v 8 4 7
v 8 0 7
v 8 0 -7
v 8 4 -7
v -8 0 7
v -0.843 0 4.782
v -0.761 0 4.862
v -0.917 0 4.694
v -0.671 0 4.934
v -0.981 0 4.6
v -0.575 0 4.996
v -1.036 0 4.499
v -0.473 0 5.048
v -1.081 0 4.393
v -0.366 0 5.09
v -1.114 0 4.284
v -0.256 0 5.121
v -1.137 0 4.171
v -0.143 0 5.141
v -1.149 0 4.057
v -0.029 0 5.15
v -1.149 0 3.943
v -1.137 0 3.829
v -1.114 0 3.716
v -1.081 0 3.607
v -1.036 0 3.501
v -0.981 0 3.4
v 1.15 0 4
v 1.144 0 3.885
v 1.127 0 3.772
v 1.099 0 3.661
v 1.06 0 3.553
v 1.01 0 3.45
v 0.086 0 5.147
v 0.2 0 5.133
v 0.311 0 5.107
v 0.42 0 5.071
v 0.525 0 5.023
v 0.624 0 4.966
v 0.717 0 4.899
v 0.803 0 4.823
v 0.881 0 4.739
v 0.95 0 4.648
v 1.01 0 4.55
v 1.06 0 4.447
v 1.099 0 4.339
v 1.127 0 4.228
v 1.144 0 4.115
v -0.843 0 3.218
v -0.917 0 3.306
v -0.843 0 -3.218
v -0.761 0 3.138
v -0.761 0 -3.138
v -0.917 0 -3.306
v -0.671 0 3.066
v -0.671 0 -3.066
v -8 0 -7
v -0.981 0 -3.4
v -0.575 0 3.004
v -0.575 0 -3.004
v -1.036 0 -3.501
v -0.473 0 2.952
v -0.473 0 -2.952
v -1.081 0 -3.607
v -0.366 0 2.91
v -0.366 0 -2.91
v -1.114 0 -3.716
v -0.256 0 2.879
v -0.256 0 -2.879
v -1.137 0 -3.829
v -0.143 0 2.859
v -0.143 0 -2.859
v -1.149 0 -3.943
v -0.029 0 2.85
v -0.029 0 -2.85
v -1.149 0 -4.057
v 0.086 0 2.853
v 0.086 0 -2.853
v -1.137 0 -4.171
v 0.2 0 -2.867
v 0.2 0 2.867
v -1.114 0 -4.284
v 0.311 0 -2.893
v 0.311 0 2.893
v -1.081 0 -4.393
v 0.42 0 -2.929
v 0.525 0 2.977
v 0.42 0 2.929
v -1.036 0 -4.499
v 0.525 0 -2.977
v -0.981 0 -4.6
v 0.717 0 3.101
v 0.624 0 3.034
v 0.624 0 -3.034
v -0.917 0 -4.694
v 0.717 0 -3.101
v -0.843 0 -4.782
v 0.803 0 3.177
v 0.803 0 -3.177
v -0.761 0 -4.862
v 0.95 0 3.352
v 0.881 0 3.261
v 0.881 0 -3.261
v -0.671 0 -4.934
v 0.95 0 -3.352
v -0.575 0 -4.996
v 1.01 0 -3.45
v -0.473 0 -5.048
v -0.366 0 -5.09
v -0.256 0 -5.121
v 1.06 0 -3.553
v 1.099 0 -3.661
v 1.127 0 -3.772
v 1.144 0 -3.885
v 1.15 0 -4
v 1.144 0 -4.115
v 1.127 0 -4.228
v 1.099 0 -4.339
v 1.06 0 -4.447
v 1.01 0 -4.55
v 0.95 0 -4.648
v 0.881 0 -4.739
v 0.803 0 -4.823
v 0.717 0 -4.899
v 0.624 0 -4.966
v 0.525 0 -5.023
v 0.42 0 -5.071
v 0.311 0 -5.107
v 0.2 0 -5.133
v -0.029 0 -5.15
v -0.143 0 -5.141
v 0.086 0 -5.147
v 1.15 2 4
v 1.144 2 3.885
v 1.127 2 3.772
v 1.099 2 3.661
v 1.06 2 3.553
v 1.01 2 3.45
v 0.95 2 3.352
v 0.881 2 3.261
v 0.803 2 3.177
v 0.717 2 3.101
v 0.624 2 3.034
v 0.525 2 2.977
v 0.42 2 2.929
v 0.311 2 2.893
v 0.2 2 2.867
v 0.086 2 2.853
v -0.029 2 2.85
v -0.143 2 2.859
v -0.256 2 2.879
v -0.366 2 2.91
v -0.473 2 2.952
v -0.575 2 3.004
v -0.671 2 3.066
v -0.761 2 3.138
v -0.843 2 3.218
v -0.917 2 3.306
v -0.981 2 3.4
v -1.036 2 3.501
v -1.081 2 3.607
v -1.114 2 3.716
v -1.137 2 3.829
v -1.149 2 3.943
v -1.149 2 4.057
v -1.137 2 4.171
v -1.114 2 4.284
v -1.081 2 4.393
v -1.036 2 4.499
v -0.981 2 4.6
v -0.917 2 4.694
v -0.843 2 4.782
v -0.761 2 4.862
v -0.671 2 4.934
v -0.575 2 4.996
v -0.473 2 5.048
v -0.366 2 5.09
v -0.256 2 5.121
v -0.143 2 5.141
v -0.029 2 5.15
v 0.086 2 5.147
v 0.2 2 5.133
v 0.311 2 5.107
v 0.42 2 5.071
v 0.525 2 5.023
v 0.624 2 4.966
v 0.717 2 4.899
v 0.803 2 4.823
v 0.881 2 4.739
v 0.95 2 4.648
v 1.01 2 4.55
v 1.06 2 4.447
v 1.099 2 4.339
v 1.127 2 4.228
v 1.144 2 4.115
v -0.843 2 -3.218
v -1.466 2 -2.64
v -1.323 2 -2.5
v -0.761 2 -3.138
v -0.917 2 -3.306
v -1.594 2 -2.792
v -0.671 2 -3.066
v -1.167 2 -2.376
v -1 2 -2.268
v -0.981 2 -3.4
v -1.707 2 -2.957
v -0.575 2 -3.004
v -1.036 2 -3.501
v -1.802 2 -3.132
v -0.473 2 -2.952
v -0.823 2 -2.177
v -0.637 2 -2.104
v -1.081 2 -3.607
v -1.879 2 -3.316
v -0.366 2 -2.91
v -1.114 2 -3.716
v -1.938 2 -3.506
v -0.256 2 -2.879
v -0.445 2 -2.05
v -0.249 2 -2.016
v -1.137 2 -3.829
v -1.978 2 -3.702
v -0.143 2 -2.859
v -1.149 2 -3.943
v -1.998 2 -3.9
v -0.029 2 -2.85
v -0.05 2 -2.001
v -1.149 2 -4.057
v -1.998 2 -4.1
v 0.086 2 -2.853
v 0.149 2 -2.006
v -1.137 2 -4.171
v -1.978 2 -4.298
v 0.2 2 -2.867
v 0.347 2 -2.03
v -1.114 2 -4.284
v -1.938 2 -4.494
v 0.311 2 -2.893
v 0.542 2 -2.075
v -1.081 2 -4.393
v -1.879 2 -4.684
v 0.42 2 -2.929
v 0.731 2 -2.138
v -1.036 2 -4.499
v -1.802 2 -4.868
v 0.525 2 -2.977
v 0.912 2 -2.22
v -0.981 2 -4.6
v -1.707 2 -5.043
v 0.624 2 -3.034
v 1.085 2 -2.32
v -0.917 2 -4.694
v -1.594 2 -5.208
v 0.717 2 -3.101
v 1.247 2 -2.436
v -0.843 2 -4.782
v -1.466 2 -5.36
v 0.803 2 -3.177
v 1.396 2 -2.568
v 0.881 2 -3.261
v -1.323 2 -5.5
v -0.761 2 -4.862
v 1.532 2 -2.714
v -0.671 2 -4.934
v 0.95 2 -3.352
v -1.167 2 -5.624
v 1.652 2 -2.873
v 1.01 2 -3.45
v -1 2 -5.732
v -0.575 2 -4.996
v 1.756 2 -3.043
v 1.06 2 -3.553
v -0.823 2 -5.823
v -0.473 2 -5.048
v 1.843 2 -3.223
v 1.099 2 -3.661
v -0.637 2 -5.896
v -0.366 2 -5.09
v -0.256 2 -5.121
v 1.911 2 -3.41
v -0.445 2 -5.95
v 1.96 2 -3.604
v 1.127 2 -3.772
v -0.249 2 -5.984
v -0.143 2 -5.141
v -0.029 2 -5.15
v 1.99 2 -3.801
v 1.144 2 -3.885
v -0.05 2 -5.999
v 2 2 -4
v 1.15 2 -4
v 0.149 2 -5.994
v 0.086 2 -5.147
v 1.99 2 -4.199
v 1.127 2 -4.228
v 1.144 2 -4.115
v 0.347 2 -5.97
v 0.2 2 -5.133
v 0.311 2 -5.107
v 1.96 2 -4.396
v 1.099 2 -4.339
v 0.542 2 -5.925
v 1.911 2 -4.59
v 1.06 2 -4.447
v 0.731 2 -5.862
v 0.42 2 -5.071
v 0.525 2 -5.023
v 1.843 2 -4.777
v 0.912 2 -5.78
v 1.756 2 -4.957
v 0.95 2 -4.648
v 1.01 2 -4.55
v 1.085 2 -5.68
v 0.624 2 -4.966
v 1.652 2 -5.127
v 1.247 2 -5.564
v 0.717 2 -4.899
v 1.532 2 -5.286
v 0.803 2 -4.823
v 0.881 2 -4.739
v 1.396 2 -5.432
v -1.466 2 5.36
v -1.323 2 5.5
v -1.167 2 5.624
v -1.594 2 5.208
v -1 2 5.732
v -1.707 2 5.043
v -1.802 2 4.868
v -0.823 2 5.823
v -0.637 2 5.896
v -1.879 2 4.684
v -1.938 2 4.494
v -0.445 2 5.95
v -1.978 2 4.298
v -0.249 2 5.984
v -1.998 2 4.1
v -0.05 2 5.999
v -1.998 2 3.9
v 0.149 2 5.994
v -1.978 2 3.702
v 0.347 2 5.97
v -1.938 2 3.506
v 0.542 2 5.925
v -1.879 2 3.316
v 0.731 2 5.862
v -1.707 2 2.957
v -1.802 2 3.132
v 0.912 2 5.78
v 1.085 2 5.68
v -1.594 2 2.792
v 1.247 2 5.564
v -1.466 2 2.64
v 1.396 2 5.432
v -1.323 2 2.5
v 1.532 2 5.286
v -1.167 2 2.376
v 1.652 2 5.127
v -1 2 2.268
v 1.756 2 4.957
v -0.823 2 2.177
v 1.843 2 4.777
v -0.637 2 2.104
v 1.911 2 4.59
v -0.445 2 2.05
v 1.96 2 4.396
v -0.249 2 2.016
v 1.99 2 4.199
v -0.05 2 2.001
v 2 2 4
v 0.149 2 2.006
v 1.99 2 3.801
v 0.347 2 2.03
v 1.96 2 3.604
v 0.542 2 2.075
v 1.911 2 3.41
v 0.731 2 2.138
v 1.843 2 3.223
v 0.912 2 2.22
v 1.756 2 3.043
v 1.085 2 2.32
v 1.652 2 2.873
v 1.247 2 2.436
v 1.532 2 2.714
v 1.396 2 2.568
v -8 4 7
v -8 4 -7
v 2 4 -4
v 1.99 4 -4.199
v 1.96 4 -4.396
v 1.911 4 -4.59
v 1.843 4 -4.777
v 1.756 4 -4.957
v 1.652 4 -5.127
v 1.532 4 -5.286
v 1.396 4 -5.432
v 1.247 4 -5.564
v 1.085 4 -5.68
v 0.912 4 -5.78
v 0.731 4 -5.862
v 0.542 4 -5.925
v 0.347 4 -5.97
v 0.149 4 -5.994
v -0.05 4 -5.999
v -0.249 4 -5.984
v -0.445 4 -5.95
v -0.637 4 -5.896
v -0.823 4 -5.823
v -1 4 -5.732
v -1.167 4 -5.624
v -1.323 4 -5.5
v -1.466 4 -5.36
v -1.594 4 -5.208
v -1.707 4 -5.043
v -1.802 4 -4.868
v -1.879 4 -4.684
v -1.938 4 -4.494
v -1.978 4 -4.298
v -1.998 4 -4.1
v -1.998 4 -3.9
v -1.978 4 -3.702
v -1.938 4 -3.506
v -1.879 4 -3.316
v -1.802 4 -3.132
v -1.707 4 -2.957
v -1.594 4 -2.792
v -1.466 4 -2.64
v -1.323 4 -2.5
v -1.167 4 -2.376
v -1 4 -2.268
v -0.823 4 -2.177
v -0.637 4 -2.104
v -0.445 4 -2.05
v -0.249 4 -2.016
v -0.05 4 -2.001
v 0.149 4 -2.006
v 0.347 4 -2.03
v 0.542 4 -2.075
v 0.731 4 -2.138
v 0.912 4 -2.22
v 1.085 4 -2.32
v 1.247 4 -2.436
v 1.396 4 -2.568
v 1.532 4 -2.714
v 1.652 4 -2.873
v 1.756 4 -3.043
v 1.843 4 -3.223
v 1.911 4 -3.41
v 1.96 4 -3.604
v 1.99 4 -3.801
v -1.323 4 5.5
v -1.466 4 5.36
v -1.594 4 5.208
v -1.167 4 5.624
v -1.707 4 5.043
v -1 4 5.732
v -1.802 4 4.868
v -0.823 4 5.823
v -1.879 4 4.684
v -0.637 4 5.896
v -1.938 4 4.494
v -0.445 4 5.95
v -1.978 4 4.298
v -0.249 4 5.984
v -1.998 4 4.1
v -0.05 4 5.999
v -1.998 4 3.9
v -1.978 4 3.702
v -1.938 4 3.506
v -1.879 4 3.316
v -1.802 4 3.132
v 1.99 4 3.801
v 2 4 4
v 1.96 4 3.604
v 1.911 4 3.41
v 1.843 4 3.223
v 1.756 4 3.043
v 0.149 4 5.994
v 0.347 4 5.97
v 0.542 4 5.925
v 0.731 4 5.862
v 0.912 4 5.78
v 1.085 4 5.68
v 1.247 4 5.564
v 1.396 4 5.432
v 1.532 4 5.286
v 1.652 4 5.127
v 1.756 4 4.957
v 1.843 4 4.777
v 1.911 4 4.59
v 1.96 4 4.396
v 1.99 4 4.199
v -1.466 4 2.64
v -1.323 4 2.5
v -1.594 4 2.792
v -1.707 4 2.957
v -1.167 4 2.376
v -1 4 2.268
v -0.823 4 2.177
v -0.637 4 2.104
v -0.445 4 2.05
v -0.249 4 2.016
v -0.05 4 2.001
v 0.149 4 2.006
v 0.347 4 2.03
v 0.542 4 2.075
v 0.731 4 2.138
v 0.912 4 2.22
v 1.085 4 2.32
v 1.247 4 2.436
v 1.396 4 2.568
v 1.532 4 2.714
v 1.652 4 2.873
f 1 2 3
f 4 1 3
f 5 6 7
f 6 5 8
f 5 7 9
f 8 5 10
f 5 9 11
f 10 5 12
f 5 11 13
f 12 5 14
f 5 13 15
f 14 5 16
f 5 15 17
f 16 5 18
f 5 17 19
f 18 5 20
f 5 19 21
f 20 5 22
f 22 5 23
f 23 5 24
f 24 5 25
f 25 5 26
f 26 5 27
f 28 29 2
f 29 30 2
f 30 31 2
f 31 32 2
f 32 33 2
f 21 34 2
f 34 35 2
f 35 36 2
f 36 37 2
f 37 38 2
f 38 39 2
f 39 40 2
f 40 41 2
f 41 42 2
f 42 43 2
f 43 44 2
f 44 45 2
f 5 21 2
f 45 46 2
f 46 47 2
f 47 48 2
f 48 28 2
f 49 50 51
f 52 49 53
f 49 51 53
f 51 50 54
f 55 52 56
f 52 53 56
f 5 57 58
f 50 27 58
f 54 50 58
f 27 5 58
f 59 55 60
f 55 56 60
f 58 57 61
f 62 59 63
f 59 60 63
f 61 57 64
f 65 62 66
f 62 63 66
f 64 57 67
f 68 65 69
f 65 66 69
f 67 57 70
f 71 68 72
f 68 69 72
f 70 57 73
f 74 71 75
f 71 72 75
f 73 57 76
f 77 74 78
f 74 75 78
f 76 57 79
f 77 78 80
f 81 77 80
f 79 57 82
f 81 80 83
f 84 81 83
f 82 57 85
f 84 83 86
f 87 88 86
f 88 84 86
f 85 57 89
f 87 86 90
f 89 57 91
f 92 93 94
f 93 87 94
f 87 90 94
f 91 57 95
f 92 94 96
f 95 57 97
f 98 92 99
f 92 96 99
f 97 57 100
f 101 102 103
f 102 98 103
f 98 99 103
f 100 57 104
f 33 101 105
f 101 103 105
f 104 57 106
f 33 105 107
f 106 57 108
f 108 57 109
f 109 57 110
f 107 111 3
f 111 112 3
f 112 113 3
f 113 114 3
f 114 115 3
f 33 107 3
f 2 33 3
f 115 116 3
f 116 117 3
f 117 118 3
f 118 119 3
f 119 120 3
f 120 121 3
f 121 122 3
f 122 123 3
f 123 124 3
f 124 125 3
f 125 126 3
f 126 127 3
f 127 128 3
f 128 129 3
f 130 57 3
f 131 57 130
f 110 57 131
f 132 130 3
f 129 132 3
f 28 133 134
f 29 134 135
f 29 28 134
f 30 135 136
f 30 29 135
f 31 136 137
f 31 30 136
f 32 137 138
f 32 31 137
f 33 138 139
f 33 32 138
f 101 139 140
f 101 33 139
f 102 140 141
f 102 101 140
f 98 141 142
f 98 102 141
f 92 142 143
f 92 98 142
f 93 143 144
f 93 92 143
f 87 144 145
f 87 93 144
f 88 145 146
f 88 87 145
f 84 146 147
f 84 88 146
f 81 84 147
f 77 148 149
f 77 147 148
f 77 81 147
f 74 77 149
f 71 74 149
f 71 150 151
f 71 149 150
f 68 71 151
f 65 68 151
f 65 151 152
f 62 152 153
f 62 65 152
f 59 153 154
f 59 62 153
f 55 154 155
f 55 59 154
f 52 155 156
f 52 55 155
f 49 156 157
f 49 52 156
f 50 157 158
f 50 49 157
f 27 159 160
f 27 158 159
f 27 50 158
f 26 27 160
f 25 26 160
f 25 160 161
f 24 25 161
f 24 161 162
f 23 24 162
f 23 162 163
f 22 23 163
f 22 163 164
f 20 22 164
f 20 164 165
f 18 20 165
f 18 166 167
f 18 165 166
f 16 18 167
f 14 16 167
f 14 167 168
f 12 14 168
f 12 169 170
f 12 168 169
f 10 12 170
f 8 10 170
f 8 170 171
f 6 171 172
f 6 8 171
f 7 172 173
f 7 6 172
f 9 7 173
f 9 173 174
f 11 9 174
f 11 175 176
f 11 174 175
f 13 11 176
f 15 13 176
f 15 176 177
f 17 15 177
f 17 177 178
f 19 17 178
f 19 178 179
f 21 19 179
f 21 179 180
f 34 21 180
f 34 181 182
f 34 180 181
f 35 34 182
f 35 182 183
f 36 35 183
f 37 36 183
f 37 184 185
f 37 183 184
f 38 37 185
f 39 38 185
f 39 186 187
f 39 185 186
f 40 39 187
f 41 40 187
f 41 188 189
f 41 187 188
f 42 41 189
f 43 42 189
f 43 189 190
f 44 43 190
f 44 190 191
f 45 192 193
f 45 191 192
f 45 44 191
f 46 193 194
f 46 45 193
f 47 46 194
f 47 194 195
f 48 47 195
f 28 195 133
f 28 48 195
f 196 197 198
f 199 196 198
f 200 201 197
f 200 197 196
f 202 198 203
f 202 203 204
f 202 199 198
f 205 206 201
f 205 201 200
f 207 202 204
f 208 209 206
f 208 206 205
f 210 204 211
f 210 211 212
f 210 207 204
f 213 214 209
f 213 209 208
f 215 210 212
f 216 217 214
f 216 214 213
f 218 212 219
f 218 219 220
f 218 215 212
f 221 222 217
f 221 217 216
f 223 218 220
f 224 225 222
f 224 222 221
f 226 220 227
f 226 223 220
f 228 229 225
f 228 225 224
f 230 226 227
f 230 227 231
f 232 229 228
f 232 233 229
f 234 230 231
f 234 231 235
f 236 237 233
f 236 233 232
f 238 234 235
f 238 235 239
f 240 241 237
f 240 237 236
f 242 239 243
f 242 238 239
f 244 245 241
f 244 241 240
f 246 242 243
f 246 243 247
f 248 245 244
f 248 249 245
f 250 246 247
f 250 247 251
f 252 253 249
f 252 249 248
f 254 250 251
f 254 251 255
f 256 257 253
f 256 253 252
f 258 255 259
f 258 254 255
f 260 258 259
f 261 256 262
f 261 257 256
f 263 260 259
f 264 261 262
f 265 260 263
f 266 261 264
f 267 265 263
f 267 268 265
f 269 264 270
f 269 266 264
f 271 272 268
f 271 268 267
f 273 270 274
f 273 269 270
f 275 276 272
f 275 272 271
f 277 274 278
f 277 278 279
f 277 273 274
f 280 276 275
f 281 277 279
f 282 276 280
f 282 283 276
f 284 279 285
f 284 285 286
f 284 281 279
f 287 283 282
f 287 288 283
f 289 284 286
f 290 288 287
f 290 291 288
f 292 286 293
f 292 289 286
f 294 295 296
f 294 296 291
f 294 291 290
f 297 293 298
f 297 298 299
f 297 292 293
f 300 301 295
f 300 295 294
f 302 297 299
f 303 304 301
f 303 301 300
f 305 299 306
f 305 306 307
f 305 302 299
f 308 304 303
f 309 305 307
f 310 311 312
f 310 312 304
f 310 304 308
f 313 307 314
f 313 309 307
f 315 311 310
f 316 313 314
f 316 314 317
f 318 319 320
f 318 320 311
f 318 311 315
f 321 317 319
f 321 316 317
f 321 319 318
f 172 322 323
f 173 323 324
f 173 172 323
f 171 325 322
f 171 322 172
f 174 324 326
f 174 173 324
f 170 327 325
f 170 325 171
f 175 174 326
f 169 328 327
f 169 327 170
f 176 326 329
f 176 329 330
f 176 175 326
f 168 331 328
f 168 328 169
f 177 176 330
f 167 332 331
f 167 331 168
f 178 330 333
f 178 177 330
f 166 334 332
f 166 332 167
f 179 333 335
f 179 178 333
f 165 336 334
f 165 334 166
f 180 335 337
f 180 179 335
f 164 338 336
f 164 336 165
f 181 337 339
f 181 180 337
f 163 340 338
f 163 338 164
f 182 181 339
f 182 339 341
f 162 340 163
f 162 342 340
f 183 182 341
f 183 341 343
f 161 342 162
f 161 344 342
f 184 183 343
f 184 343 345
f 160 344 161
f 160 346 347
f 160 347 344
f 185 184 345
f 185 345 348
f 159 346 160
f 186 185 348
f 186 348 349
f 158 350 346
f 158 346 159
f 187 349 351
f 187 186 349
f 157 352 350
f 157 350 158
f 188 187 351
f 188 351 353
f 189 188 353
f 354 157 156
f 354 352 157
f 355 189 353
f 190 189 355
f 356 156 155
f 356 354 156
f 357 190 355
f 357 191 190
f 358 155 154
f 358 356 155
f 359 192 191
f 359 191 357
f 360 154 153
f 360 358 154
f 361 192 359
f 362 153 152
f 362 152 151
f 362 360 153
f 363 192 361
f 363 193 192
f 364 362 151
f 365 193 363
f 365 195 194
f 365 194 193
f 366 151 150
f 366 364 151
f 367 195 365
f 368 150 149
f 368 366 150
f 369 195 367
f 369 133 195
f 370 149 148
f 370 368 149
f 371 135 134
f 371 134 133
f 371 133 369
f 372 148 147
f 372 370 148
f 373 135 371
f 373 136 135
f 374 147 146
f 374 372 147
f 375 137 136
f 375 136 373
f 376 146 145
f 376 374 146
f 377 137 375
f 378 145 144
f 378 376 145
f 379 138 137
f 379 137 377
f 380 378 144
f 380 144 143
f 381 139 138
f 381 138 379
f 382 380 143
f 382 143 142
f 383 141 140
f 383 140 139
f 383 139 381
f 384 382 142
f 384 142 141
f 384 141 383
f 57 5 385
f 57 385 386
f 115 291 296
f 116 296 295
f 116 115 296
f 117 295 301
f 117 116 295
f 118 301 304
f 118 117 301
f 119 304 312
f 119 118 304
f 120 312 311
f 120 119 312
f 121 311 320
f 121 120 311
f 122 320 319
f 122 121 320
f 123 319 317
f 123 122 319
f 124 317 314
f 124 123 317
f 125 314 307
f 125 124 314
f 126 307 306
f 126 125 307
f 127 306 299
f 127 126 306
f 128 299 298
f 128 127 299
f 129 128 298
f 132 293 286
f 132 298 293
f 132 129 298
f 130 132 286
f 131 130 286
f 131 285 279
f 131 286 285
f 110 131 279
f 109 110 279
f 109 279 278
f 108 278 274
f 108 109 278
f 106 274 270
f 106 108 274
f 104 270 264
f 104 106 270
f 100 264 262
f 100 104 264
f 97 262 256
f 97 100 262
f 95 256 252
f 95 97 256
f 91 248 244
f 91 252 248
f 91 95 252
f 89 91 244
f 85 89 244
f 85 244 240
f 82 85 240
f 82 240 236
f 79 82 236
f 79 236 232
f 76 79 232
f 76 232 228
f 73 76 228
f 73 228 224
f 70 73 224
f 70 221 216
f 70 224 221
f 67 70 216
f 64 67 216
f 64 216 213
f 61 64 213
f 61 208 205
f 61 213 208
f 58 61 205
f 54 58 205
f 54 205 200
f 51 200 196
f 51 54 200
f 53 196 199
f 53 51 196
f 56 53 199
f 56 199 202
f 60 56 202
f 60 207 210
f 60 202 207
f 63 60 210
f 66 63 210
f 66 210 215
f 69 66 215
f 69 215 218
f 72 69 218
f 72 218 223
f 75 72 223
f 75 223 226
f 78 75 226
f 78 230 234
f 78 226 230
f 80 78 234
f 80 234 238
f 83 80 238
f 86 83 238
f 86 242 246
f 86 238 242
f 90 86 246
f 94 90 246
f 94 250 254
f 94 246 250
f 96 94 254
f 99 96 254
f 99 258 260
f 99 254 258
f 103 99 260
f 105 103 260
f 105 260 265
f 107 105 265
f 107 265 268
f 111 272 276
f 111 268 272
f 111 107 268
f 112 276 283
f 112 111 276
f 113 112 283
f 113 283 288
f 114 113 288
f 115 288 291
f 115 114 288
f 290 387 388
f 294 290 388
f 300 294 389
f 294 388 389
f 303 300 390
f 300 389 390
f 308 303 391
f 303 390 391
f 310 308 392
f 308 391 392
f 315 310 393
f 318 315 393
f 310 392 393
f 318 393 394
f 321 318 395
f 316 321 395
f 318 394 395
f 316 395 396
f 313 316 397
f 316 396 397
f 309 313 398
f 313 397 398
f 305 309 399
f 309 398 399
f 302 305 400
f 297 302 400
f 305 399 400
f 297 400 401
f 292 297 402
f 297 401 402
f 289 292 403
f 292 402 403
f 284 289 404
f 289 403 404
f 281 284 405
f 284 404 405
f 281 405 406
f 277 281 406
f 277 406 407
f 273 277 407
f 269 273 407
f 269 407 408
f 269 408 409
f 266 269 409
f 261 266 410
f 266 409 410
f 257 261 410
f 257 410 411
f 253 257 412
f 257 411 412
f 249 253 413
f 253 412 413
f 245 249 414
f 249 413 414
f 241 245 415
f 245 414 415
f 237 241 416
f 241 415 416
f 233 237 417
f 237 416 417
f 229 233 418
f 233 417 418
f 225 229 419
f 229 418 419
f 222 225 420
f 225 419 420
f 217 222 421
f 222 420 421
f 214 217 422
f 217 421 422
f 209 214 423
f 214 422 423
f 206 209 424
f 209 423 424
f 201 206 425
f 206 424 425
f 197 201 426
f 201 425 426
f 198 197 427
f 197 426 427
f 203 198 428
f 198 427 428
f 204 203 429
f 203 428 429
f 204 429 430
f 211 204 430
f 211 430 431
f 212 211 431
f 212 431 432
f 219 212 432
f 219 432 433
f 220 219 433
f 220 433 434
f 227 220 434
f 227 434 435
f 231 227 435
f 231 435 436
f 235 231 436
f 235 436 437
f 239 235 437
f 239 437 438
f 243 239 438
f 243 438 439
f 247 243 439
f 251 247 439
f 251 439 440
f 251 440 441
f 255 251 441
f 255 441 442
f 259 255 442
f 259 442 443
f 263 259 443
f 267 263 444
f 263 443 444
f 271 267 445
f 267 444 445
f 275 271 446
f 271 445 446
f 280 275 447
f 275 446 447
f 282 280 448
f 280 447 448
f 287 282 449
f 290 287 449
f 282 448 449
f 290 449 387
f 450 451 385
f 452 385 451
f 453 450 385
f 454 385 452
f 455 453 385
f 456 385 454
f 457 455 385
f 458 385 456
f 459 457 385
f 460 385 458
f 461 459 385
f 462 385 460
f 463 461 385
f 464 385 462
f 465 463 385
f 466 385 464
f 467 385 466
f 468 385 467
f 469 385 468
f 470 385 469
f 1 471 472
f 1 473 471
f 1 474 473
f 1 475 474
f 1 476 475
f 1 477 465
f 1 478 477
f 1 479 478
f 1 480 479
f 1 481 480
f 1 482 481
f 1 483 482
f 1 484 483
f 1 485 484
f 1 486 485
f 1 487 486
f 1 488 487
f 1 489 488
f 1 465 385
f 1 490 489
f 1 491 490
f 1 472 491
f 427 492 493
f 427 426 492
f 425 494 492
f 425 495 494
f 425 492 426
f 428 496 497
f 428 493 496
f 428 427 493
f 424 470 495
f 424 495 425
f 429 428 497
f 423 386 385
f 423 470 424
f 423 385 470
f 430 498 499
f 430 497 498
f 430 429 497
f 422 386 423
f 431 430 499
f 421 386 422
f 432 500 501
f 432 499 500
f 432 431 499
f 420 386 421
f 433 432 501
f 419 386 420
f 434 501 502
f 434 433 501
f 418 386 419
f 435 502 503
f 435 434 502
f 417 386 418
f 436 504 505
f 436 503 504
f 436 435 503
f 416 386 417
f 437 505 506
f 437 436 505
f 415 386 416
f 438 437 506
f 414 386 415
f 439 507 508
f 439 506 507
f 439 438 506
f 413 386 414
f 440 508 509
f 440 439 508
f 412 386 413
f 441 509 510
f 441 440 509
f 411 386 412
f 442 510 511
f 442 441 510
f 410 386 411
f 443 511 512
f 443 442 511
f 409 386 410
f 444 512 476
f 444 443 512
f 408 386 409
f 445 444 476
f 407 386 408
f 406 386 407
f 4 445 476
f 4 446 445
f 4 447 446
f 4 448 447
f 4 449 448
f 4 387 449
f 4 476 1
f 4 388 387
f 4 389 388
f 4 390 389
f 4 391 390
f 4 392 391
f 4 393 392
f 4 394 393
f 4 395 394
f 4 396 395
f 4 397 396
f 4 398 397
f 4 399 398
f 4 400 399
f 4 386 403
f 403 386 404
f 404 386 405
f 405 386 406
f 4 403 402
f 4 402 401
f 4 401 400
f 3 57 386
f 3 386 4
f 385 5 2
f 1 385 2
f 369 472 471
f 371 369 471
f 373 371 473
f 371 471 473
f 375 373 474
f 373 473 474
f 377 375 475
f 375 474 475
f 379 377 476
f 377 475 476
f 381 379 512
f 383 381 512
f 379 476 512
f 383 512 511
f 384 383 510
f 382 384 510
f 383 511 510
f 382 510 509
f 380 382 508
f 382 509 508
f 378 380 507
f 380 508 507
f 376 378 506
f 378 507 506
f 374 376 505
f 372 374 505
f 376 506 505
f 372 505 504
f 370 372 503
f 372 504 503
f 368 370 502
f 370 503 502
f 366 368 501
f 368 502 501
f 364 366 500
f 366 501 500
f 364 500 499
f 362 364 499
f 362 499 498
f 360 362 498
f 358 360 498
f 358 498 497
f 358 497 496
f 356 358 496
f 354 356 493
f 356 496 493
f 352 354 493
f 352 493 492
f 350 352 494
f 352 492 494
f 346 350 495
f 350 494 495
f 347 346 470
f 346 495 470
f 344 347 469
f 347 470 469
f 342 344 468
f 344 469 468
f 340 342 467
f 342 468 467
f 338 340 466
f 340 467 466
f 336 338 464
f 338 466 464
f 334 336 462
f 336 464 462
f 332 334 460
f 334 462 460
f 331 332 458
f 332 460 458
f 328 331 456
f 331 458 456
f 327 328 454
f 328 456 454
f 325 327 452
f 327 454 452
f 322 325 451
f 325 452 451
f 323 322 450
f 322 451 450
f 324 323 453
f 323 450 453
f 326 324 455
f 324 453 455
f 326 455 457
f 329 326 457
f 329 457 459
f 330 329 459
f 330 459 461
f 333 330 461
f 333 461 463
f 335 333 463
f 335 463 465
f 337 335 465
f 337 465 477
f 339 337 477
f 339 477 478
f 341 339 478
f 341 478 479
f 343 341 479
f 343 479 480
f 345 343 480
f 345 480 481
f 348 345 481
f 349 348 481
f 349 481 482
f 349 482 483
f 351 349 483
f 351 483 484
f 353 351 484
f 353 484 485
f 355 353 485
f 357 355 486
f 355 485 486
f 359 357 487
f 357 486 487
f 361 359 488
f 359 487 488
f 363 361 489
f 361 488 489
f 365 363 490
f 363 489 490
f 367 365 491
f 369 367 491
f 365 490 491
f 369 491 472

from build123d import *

# Parameters (mm, degrees)
SKETCH_1_W          = 16
SKETCH_1_H          = 14
SKETCH_1_R          = 1.15
EXTRUDE_1_DEPTH     = 4
SKETCH_2_R          = 2
CUT_EXTRUDE_1_DEPTH = 2


with BuildPart() as part:
    # 스케치1 → 보스-돌출1 (new body)
    with BuildSketch(Plane(origin=(0, 0, 0), x_dir=(1, 0, 0), z_dir=(0, 1, 0))):
        Rectangle(SKETCH_1_W, SKETCH_1_H)
        with Locations((0, 4)):
            Circle(SKETCH_1_R, mode=Mode.SUBTRACT)
        with Locations((0, -4)):
            Circle(SKETCH_1_R, mode=Mode.SUBTRACT)
    extrude(amount=EXTRUDE_1_DEPTH)

    # 스케치2 → 컷-돌출1 (cut)
    with BuildSketch(Plane(origin=(0, 4, 0), x_dir=(1, 0, 0), z_dir=(0, 1, 0))):
        with Locations((0, 4)):
            Circle(SKETCH_2_R)
        with Locations((0, -4)):
            Circle(SKETCH_2_R)
    extrude(amount=-CUT_EXTRUDE_1_DEPTH, mode=Mode.SUBTRACT)


solid = part.part
